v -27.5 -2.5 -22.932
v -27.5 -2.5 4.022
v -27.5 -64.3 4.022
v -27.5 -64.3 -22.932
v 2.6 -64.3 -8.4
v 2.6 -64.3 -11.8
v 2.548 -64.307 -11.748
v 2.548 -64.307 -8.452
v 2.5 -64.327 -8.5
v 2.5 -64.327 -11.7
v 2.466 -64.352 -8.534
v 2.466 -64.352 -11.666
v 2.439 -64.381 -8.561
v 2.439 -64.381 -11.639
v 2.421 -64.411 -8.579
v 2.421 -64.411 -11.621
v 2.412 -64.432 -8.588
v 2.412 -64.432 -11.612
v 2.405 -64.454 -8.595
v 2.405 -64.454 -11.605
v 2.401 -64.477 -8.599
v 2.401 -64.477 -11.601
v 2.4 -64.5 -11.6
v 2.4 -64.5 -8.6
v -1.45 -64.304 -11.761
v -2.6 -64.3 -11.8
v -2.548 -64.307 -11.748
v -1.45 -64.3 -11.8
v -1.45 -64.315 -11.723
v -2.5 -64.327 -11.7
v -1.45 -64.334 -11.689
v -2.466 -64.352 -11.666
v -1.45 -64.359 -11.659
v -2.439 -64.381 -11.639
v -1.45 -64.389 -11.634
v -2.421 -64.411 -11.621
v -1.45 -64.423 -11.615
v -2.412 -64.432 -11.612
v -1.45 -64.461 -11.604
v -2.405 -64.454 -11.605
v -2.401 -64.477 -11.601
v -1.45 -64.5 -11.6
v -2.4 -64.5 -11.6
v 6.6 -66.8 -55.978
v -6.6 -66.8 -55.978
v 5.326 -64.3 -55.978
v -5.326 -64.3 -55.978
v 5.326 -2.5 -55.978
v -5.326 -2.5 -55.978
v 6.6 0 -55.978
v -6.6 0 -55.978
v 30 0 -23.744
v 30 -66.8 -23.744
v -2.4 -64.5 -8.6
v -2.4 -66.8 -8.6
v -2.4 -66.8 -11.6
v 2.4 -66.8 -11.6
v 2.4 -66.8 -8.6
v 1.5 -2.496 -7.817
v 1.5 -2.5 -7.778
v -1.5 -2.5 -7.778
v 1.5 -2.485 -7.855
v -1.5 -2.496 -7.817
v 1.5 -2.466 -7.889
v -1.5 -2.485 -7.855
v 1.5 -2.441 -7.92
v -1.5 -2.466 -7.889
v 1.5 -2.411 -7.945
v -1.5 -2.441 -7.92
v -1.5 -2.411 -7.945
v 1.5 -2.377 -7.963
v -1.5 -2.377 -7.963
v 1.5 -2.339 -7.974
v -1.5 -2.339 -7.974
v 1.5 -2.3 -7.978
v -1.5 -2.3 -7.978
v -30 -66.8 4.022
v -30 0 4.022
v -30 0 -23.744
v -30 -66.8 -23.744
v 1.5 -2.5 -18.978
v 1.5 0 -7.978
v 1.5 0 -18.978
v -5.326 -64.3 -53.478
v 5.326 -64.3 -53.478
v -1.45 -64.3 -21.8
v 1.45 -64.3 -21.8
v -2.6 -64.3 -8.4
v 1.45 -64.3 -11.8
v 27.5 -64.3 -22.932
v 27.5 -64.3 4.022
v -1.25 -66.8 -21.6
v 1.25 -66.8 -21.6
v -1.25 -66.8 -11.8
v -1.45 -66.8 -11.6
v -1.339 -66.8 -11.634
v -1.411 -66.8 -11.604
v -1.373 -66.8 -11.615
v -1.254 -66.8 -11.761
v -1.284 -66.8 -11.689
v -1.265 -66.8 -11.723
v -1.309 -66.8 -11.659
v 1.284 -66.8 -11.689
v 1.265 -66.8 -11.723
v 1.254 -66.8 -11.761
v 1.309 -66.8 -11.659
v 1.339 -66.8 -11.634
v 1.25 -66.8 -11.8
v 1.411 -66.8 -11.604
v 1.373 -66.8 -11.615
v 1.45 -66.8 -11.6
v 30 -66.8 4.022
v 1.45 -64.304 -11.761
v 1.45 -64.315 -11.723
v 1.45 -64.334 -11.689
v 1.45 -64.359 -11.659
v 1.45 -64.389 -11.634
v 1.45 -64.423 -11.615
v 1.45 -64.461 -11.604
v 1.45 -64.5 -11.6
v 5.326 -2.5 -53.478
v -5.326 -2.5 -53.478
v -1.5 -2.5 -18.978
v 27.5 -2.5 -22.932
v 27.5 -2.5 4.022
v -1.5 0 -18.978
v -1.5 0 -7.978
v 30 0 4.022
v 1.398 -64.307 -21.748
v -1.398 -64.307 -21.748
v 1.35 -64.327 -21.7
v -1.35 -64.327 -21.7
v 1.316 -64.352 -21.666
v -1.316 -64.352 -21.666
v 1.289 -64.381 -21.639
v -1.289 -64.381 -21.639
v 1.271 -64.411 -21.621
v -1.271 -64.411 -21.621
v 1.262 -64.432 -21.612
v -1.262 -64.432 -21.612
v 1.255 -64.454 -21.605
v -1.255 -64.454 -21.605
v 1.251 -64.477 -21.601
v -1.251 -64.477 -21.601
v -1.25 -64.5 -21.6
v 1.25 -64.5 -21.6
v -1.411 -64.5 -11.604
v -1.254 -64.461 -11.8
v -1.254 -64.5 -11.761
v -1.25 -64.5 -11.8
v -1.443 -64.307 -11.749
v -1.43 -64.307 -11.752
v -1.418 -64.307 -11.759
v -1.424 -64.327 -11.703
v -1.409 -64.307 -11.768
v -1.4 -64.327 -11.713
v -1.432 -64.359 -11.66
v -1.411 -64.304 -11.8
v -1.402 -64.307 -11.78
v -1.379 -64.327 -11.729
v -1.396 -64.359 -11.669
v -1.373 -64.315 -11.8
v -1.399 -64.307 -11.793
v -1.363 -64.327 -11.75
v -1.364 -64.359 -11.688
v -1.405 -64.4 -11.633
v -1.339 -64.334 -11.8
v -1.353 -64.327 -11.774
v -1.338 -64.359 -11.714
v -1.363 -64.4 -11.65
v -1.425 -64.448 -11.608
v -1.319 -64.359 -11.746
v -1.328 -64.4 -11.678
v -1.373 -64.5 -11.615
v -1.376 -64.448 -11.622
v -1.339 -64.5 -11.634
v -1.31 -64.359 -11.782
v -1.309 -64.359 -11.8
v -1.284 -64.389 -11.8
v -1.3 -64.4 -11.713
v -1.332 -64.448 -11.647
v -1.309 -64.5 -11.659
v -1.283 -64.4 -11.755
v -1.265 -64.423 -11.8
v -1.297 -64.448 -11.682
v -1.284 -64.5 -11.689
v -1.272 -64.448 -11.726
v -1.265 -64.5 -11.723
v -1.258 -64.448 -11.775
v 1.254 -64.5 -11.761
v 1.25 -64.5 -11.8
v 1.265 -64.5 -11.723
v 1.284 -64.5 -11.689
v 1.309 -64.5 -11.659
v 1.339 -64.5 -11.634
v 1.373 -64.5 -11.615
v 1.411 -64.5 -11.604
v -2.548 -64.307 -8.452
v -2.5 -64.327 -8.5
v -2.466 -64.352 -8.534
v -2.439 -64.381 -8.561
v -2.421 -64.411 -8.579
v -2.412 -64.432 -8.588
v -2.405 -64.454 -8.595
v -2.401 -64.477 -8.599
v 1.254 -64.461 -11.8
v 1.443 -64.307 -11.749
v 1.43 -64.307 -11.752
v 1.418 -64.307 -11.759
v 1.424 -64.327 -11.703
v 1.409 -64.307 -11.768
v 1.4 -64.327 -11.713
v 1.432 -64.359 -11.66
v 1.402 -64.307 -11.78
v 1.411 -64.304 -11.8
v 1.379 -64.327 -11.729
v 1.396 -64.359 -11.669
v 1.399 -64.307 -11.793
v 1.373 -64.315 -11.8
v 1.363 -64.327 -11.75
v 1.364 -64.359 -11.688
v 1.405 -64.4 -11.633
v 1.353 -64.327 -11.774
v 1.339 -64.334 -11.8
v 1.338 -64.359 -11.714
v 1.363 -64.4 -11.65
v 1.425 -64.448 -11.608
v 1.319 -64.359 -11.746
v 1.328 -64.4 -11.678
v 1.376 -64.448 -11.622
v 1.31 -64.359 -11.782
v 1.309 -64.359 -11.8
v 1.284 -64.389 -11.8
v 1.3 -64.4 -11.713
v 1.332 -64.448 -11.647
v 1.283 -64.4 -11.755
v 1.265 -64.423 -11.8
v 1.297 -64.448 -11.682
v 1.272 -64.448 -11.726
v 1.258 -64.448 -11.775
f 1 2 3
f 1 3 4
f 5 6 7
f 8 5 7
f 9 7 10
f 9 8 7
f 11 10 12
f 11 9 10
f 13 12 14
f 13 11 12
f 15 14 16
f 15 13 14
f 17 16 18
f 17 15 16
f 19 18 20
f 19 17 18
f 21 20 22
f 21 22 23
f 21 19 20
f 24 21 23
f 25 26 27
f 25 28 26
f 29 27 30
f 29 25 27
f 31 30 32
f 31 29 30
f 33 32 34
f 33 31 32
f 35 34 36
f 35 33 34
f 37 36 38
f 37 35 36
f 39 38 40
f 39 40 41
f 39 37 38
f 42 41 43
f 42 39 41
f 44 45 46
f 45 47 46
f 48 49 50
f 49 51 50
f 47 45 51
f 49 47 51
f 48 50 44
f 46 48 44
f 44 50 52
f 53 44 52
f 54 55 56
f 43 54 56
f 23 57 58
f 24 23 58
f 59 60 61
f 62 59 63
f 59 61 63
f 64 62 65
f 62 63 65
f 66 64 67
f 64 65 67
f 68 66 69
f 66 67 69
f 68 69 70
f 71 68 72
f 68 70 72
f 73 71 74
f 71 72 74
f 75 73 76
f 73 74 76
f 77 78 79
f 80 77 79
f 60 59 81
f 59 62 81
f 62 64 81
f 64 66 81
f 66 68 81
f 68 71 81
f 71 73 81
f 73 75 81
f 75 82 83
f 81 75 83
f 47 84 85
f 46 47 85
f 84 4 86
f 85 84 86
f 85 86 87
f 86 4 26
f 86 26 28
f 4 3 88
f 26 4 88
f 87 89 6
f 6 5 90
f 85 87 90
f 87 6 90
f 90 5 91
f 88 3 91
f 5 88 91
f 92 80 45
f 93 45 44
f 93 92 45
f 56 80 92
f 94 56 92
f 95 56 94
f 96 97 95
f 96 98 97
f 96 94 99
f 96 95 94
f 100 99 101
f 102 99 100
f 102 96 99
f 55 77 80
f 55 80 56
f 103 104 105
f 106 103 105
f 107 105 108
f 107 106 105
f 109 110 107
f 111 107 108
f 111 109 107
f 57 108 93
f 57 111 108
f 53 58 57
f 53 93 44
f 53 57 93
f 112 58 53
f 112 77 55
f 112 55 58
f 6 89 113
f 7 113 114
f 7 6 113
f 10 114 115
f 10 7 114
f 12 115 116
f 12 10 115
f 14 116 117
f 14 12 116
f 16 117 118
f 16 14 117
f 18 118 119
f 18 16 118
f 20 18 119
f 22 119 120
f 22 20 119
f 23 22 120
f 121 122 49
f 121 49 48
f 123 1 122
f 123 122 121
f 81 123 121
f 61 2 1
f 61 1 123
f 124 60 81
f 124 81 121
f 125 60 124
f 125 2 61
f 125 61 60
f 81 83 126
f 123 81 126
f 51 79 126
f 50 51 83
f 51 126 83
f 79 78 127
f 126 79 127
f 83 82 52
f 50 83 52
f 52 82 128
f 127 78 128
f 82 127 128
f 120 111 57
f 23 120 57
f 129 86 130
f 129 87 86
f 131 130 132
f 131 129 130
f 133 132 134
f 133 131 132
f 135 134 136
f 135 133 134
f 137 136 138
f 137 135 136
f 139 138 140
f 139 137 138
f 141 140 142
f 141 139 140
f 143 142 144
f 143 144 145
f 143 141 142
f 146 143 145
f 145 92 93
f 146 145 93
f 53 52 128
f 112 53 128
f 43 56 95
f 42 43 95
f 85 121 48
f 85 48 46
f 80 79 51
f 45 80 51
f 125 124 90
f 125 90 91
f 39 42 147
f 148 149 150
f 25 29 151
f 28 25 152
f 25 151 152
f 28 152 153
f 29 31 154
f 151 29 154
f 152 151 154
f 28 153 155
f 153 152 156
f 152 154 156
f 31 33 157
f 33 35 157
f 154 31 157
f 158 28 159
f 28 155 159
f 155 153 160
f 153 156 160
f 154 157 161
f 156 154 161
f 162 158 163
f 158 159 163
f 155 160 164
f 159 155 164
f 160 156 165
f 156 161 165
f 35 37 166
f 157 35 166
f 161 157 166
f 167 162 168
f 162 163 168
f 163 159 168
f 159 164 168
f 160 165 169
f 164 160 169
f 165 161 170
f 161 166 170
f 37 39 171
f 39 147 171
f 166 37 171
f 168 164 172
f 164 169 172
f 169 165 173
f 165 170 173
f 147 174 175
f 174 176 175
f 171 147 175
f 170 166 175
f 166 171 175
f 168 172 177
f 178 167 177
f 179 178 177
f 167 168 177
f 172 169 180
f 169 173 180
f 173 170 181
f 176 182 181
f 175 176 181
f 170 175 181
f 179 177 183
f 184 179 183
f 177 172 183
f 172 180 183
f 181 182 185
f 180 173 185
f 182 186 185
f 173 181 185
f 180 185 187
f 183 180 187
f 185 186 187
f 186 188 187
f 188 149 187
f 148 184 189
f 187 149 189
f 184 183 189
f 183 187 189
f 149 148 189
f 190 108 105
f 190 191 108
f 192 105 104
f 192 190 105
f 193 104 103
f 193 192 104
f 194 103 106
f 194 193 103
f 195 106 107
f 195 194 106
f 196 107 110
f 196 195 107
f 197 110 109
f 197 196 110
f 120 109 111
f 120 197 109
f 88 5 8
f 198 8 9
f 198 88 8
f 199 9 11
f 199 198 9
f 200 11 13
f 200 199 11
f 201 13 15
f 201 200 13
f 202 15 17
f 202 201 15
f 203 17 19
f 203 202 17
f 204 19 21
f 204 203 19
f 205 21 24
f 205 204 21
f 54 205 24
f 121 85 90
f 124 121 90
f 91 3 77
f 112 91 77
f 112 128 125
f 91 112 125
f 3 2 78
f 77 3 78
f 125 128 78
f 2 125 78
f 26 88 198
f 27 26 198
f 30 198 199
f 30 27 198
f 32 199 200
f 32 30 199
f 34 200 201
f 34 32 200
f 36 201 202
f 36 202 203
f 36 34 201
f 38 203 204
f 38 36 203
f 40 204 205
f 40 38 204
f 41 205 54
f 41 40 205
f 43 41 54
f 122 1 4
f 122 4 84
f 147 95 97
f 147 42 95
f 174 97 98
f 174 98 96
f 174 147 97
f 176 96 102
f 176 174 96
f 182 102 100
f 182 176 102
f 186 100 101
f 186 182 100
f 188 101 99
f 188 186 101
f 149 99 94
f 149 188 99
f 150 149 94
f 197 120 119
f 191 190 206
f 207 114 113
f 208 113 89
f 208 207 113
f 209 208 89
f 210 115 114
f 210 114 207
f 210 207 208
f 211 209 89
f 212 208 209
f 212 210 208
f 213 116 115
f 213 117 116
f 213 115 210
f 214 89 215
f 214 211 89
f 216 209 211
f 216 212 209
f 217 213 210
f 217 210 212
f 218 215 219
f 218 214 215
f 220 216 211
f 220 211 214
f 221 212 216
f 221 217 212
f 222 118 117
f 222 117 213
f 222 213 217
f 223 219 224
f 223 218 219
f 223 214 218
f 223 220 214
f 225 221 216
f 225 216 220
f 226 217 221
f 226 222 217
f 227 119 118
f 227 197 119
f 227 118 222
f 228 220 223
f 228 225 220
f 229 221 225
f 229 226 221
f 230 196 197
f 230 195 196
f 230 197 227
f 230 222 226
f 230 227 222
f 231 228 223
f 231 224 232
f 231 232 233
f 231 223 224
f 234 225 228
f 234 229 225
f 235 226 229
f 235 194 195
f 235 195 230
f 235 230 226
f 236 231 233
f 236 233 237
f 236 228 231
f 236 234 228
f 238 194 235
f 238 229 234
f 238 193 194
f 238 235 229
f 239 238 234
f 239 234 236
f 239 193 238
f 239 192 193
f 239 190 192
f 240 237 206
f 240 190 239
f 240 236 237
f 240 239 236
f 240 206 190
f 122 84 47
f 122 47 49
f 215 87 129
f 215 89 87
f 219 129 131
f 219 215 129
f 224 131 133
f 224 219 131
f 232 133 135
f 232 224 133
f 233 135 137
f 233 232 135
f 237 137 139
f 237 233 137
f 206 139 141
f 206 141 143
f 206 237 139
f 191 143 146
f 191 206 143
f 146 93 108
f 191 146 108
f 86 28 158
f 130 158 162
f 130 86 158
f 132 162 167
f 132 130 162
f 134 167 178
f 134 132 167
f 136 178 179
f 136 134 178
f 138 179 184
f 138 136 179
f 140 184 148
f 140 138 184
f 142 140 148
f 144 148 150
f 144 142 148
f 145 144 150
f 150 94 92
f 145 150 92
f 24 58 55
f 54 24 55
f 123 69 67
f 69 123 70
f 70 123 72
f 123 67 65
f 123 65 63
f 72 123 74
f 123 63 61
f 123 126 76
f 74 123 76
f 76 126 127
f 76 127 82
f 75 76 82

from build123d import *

# Parameters (mm, degrees)
F1_DEPTH = 66.8
F2_T     = -2.5
F3_DEPTH = 25
F5_DEPTH = 25
F6_R     = 0.2
F8_DEPTH = 25
F9_R     = 0.2


with BuildPart() as f1:
    # F0 (on Front) → F1 (new body)
    with BuildSketch(Plane.XZ):
        Polygon((0, -55.9782199562), (0, 4.0217800438), (-30, 4.0217800438), (-30, -23.7439740449), (-6.6, -55.9782199562), align=None)
        Polygon((30, 4.0217800438), (0, 4.0217800438), (0, -55.9782199562), (6.6, -55.9782199562), (30, -23.7439740449), align=None)
    extrude(amount=F1_DEPTH)

    # F2
    f2_openings = [f1.faces().sort_by_distance(p)[0] for p in [
        (0, -33.4, 4.02178),
    ]]
    offset(amount=F2_T, openings=f2_openings)

    # F3 (cut): a face of the model
    f3_faces = [f1.faces().sort_by_distance(p)[0] for p in [
        (0, -33.4, -53.4782199562),
    ]]
    extrude(f3_faces, amount=-F3_DEPTH, mode=Mode.SUBTRACT)

    # F4 (on face) → F5 (cut)
    with BuildSketch(Plane.XZ.offset(66.8)):
        Polygon((-2.4, -8.6), (-2.4, -11.6), (-1.25, -11.6), (-1.25, -21.6), (0, -21.6), (0, -8.6), align=None)
        Polygon((2.4, -8.6), (0, -8.6), (0, -21.6), (1.25, -21.6), (1.25, -11.6), (2.4, -11.6), align=None)
    extrude(amount=-F5_DEPTH, mode=Mode.SUBTRACT)

    # F6
    f6_edges = [f1.edges().sort_by_distance(p)[0] for p in [
        (1.25, -65.55, -11.6),
        (-1.25, -65.55, -11.6),
        (0, -64.3, -8.6),
        (2.4, -64.3, -10.1),
        (1.825, -64.3, -11.6),
        (1.25, -64.3, -16.6),
        (-2.4, -64.3, -10.1),
        (-1.825, -64.3, -11.6),
        (0, -64.3, -21.6),
        (-1.25, -64.3, -16.6),
    ]]
    fillet(f6_edges, radius=F6_R)

    # F7 (on face) → F8 (cut)
    with BuildSketch(Plane(origin=(0, 0, 0), x_dir=(-1, 0, 0), z_dir=(0, 1, 0))):
        Polygon((1.5, -7.9782199562), (0, -7.9782199562), (-1.5, -7.9782199562), (-1.5, -18.9782199562), (0, -18.9782199562), (1.5, -18.9782199562), align=None)
    extrude(amount=-F8_DEPTH, mode=Mode.SUBTRACT)

    # F9
    f9_edges = [f1.edges().sort_by_distance(p)[0] for p in [
        (0, -2.5, -7.97822),
    ]]
    fillet(f9_edges, radius=F9_R)


solid = f1.part
